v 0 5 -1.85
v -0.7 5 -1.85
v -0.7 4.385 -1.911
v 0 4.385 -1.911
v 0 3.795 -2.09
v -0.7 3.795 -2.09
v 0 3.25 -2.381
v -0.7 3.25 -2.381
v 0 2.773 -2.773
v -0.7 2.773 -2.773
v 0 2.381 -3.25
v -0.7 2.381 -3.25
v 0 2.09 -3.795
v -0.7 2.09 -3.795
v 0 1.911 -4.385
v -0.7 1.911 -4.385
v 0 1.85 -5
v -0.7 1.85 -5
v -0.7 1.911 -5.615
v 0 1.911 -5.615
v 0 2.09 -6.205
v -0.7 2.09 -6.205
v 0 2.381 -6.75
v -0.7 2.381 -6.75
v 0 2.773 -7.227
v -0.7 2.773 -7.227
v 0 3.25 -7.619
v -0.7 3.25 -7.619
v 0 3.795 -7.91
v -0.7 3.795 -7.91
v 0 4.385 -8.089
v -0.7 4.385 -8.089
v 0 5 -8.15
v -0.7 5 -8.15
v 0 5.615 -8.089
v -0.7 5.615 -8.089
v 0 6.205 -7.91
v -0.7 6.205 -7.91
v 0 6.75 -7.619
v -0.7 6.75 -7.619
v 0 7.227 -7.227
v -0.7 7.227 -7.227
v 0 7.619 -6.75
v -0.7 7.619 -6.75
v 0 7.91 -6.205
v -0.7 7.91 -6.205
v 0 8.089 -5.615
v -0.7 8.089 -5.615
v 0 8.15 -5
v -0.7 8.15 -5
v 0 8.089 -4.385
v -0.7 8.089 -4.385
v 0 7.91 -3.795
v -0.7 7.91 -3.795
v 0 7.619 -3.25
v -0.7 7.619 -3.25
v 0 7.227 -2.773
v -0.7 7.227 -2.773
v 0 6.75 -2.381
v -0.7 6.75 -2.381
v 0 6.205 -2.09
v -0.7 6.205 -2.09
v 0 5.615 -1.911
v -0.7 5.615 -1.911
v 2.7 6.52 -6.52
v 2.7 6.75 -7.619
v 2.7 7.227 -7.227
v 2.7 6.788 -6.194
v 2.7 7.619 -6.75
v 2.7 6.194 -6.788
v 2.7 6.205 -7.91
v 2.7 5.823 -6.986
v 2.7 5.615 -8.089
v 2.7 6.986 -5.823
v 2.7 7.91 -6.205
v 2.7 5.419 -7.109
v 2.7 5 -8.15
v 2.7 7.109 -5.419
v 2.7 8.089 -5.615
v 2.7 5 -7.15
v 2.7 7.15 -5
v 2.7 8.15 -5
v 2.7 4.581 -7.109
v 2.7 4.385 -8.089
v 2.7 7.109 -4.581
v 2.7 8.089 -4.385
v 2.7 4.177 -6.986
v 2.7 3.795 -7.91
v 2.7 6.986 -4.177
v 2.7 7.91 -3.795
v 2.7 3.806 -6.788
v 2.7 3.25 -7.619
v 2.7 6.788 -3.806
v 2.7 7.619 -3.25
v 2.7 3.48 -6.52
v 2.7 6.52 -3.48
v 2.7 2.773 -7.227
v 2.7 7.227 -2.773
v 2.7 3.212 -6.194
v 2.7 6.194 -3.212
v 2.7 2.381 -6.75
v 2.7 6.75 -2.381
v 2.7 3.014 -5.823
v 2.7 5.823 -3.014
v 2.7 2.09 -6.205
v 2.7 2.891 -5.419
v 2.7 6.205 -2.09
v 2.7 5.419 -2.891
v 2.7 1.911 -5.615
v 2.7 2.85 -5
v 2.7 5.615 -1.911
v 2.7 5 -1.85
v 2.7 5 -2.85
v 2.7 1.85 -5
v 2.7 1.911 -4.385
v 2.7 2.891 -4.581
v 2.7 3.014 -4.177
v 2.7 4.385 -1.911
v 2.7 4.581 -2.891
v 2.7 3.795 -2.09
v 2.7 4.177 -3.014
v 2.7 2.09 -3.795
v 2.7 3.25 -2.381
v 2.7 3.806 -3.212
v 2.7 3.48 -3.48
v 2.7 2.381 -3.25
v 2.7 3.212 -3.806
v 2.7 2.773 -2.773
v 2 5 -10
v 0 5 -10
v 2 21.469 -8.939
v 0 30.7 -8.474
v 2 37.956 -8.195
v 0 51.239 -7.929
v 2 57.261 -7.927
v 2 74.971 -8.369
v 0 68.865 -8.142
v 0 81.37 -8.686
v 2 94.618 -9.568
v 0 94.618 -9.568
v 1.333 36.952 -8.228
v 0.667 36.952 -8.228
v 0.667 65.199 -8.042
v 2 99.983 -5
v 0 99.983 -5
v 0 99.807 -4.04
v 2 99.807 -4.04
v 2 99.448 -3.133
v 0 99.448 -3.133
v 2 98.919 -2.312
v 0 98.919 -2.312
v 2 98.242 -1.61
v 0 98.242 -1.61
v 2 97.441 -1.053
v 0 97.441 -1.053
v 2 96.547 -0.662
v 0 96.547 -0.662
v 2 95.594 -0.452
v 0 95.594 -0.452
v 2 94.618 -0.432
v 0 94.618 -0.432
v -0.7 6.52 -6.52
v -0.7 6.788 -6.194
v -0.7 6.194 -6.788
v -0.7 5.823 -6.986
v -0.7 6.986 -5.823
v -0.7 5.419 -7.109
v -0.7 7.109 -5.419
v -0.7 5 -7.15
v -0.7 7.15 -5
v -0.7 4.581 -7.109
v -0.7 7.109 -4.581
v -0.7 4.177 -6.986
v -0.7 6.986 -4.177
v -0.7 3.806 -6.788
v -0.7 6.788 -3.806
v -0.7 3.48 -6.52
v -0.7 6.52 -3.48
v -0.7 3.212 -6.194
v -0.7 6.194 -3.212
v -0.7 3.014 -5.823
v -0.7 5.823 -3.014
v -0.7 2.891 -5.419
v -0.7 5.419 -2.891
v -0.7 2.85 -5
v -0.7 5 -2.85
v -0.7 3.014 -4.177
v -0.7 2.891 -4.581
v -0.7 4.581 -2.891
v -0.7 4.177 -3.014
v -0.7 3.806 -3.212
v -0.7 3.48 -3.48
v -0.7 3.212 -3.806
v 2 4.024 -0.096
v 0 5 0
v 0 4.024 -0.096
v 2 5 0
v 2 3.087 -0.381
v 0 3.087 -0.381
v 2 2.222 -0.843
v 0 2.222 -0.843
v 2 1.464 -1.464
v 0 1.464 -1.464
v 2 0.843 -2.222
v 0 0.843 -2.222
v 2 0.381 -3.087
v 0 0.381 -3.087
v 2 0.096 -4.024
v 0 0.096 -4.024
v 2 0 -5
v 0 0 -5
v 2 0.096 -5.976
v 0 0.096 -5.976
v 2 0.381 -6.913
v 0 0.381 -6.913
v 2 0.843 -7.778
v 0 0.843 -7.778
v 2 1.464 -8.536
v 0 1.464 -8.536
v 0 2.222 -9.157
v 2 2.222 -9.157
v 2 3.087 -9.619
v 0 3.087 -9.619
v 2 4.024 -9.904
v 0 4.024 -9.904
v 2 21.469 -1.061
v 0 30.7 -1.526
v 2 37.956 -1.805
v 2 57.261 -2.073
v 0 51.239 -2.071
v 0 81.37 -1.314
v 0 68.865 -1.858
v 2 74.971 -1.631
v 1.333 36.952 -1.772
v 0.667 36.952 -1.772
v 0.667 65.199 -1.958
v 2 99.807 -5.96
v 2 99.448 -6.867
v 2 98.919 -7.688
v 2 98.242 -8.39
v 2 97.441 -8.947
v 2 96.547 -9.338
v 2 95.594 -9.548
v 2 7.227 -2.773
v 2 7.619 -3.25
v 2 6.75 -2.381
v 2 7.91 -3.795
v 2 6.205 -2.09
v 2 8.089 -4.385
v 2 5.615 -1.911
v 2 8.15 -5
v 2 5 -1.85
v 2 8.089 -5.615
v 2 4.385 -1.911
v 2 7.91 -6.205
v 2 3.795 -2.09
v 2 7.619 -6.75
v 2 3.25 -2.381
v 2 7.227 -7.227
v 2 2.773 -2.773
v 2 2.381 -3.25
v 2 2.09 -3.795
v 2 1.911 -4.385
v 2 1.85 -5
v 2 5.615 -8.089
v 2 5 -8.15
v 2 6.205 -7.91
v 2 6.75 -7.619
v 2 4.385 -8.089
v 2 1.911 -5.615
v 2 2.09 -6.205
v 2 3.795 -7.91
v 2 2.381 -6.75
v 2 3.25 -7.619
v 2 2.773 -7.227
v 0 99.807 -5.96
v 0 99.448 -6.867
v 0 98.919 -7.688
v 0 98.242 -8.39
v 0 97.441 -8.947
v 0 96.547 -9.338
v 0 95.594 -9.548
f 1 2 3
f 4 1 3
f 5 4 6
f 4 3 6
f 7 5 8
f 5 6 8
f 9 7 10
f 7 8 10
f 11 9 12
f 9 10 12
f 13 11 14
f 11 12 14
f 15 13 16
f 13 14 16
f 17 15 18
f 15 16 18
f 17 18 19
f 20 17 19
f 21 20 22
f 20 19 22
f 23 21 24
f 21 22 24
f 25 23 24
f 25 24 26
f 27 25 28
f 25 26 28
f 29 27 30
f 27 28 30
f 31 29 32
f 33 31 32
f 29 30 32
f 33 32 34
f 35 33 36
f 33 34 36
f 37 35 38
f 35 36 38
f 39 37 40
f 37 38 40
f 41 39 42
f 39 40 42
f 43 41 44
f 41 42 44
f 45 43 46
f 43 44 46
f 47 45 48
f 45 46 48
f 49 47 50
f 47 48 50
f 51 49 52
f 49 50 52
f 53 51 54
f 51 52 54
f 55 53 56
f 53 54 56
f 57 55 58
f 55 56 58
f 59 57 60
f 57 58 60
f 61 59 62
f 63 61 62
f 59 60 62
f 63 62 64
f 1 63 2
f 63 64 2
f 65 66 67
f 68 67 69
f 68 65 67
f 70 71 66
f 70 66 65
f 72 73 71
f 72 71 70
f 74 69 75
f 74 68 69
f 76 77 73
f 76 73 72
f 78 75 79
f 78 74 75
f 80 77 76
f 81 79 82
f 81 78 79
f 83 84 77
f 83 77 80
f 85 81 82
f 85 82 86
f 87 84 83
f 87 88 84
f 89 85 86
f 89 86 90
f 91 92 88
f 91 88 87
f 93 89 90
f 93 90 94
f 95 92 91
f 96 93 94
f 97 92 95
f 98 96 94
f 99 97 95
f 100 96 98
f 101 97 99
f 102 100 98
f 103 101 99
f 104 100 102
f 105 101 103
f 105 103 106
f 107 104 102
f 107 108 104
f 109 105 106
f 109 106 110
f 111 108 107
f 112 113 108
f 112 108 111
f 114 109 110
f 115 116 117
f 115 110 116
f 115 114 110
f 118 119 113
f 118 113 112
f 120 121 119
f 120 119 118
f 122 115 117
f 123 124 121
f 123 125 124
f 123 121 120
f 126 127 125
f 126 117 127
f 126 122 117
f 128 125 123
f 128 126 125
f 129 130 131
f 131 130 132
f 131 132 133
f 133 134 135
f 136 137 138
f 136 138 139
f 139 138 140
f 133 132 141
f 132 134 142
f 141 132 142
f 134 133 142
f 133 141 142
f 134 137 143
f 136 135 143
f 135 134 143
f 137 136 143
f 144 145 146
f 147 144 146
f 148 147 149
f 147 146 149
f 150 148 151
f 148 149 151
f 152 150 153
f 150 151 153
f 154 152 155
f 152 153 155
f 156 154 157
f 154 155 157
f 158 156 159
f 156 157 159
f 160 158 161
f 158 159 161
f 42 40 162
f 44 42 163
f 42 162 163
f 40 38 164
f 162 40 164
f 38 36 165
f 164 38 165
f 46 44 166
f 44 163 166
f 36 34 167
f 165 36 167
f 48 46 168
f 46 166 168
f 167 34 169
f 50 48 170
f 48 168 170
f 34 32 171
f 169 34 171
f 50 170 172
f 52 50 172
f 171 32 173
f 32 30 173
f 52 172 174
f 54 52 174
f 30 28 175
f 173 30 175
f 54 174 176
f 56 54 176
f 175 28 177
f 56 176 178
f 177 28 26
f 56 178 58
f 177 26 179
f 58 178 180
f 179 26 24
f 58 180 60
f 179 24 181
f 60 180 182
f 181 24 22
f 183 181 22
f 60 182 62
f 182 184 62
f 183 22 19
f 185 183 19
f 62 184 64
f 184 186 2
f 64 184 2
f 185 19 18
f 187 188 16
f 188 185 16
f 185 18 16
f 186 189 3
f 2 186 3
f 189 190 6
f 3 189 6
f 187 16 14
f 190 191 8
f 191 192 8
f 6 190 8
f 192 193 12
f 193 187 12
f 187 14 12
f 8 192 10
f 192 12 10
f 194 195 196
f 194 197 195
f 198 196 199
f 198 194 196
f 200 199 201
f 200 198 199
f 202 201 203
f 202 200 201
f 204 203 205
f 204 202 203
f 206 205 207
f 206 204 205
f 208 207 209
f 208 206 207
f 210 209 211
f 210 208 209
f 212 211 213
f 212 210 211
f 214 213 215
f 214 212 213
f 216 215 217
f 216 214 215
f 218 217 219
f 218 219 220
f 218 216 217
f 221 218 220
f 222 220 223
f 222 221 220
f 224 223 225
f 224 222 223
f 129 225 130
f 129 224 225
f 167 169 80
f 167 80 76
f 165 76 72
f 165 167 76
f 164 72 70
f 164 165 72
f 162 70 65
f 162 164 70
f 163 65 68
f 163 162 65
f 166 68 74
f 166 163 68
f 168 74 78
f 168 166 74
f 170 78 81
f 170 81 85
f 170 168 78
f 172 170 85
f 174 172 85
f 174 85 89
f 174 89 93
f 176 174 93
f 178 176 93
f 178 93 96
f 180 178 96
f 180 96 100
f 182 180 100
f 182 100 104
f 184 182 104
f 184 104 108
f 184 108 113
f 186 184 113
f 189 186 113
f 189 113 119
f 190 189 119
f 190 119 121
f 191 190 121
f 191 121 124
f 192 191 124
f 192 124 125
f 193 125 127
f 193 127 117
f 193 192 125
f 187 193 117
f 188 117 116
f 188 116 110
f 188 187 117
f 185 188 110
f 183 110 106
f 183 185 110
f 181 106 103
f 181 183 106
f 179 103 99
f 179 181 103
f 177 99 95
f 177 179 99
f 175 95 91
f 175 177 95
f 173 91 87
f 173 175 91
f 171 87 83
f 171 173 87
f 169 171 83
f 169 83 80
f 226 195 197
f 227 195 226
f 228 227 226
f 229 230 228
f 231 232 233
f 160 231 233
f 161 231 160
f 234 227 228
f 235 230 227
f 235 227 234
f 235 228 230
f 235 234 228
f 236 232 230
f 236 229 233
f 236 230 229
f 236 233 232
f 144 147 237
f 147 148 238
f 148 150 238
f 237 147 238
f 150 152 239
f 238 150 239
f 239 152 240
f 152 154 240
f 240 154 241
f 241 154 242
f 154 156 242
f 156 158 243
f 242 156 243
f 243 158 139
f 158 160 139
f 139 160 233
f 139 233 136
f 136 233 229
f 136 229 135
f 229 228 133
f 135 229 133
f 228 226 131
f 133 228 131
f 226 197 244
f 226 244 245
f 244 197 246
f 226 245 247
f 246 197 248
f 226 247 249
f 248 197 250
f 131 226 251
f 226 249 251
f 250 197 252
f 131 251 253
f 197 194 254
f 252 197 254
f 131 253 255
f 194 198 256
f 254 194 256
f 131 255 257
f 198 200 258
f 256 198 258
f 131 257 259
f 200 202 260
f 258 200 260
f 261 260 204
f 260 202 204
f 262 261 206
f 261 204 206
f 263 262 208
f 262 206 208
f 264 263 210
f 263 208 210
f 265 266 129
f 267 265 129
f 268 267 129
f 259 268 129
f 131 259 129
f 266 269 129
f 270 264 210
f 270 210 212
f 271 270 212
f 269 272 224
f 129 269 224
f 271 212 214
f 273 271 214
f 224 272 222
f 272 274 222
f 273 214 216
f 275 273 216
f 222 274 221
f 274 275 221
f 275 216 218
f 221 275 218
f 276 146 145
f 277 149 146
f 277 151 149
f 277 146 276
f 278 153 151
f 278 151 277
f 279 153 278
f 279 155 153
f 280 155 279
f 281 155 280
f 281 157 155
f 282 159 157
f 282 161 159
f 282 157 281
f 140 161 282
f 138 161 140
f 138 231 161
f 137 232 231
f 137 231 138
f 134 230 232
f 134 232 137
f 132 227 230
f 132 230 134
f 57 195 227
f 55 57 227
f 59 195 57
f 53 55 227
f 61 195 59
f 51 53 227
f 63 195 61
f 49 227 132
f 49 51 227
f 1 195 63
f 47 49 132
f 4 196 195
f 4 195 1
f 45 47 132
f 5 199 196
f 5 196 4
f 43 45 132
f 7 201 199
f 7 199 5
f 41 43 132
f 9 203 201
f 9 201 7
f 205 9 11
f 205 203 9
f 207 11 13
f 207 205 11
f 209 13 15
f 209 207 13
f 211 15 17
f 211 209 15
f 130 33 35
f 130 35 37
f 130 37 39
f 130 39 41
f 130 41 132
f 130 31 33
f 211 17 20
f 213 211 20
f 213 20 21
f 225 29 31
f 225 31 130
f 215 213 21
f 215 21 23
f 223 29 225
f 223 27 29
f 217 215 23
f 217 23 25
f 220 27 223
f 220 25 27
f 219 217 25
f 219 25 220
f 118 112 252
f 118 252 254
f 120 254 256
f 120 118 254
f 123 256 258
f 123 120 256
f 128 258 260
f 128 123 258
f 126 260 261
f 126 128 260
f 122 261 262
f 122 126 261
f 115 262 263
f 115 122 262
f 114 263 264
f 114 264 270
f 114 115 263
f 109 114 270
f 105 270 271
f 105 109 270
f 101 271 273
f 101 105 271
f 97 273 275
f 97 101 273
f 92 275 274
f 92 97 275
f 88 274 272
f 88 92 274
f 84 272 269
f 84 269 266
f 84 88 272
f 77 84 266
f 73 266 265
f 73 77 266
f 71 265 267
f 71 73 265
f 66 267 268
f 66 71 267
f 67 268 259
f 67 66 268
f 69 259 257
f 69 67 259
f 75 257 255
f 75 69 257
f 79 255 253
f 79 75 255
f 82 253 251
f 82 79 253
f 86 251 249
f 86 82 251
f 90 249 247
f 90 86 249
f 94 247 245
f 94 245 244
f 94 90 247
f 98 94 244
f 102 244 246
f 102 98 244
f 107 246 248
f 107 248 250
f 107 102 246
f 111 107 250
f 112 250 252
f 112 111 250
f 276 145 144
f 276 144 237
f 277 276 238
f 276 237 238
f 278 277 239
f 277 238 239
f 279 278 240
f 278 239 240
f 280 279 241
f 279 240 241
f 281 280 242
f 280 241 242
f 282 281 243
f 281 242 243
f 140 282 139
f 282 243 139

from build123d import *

# Parameters (mm, degrees)
SKETCH1_W           = 2
SKETCH1_H           = 10
BOSS_EXTRUDE1_DEPTH = 100
SKETCH3_R           = 2.15
CUT_EXTRUDE1_DEPTH  = 90
FILLET1_R           = 5
CUT_EXTRUDE2_DEPTH  = 90
FILLET2_R           = 5
BOSS_EXTRUDE2_START = 0.7
SKETCH5_R           = 3.15
SKETCH5_R_2         = 2.15
BOSS_EXTRUDE2_DEPTH = 0.7


# Some blends are built 0.0001 mm under size
with BuildPart() as part:
    # Sketch1 → Boss-Extrude1 (new body)
    with BuildSketch(Plane(origin=(0, 0, 0), x_dir=(1, 0, 0), z_dir=(0, 1, 0))):
        with Locations((1, 5)):
            Rectangle(SKETCH1_W, SKETCH1_H)
    extrude(amount=BOSS_EXTRUDE1_DEPTH)

    # Sketch3 → Cut-Extrude1 (cut)
    with BuildSketch(Plane(origin=(2, 0, 0), x_dir=(0, 0, -1), z_dir=(1, 0, 0))):
        with Locations((5, 5)):
            Circle(SKETCH3_R)
    extrude(amount=-CUT_EXTRUDE1_DEPTH, mode=Mode.SUBTRACT)

    # Fillet1
    fillet1_edges = [part.edges().sort_by_distance(p)[0] for p in [
        (1, 0, -10),
        (1, 0, 0),
    ]]
    fillet(fillet1_edges, radius=FILLET1_R - 0.0001)  # a hair under: the kernel refuses the full size

    # Sketch4 → Cut-Extrude2 (cut)
    with BuildSketch(Plane.ZY):
        with BuildLine():
            add(Edge.make_bspline(
                [(-10, 5), (-7.336619142, 42.407665675), (-7.11394722, 65.464300782), (-10, 100)],
                knots=[0, 0, 0, 0, 1, 1, 1, 1], degree=3))
            Line((-10, 100), (-10, 5))
        make_face()
        with BuildLine():
            add(Edge.make_bspline(
                [(0, 5), (-2.663380858, 42.407665675), (-2.88605278, 65.464300782), (0, 100)],
                knots=[0, 0, 0, 0, 1, 1, 1, 1], degree=3))
            Line((0, 100), (0, 5))
        make_face()
    extrude(amount=-CUT_EXTRUDE2_DEPTH, mode=Mode.SUBTRACT)

    # Fillet2
    # the kernel refuses this fillet: 5 mm, written as the material it takes off along each edge
    with BuildSketch(Plane(origin=(2, 100, -10), x_dir=(0, -0.9968008899824262, 0.07992487554099316), z_dir=(-1, 0, 0)), Plane(origin=(0, 100, 0), x_dir=(0, -0.9968008899824262, -0.07992487554099297), z_dir=(1, 0, 0))) as fillet2_piece_1:
        with BuildLine():
            CenterArc((5.416951327, 4.999969042), FILLET2_R, 175.415752406, 94.382624457)
            Line((0.432946877, 5.39959342), (0.333266788, 5.407585907))
            Line((0.333266788, 5.407585907), (-0.099680089, 0.007992488))
            Line((-0.099680089, 0.007992488), (0.000336329, -0.099999434))
            ThreePointArc((0.000336329, -0.099999434), (2.699681925, -0.095355708), (5.399004527, -0.099999381))
            Line((5.399004527, -0.099999381), (5.399356425, 0))
        make_face()
    extrude(amount=2, mode=Mode.SUBTRACT)

    # Sketch5 → Boss-Extrude2 (add)
    with BuildSketch(Plane(origin=(2, 0, 0), x_dir=(0, 0, -1), z_dir=(1, 0, 0)).offset(BOSS_EXTRUDE2_START)):
        with Locations(Location((5, 5, 0), (0, 0, 180))):
            Circle(SKETCH5_R)
        with Locations((5, 5)):
            Circle(SKETCH5_R_2, mode=Mode.SUBTRACT)
    boss_extrude2 = extrude(amount=-BOSS_EXTRUDE2_DEPTH)

    # Mirror1: Boss-Extrude2 across plane
    add(boss_extrude2.mirror(Plane(origin=(1, 0, 0), x_dir=(0, 0, 1), z_dir=(1, 0, 0))))


solid = part.part
